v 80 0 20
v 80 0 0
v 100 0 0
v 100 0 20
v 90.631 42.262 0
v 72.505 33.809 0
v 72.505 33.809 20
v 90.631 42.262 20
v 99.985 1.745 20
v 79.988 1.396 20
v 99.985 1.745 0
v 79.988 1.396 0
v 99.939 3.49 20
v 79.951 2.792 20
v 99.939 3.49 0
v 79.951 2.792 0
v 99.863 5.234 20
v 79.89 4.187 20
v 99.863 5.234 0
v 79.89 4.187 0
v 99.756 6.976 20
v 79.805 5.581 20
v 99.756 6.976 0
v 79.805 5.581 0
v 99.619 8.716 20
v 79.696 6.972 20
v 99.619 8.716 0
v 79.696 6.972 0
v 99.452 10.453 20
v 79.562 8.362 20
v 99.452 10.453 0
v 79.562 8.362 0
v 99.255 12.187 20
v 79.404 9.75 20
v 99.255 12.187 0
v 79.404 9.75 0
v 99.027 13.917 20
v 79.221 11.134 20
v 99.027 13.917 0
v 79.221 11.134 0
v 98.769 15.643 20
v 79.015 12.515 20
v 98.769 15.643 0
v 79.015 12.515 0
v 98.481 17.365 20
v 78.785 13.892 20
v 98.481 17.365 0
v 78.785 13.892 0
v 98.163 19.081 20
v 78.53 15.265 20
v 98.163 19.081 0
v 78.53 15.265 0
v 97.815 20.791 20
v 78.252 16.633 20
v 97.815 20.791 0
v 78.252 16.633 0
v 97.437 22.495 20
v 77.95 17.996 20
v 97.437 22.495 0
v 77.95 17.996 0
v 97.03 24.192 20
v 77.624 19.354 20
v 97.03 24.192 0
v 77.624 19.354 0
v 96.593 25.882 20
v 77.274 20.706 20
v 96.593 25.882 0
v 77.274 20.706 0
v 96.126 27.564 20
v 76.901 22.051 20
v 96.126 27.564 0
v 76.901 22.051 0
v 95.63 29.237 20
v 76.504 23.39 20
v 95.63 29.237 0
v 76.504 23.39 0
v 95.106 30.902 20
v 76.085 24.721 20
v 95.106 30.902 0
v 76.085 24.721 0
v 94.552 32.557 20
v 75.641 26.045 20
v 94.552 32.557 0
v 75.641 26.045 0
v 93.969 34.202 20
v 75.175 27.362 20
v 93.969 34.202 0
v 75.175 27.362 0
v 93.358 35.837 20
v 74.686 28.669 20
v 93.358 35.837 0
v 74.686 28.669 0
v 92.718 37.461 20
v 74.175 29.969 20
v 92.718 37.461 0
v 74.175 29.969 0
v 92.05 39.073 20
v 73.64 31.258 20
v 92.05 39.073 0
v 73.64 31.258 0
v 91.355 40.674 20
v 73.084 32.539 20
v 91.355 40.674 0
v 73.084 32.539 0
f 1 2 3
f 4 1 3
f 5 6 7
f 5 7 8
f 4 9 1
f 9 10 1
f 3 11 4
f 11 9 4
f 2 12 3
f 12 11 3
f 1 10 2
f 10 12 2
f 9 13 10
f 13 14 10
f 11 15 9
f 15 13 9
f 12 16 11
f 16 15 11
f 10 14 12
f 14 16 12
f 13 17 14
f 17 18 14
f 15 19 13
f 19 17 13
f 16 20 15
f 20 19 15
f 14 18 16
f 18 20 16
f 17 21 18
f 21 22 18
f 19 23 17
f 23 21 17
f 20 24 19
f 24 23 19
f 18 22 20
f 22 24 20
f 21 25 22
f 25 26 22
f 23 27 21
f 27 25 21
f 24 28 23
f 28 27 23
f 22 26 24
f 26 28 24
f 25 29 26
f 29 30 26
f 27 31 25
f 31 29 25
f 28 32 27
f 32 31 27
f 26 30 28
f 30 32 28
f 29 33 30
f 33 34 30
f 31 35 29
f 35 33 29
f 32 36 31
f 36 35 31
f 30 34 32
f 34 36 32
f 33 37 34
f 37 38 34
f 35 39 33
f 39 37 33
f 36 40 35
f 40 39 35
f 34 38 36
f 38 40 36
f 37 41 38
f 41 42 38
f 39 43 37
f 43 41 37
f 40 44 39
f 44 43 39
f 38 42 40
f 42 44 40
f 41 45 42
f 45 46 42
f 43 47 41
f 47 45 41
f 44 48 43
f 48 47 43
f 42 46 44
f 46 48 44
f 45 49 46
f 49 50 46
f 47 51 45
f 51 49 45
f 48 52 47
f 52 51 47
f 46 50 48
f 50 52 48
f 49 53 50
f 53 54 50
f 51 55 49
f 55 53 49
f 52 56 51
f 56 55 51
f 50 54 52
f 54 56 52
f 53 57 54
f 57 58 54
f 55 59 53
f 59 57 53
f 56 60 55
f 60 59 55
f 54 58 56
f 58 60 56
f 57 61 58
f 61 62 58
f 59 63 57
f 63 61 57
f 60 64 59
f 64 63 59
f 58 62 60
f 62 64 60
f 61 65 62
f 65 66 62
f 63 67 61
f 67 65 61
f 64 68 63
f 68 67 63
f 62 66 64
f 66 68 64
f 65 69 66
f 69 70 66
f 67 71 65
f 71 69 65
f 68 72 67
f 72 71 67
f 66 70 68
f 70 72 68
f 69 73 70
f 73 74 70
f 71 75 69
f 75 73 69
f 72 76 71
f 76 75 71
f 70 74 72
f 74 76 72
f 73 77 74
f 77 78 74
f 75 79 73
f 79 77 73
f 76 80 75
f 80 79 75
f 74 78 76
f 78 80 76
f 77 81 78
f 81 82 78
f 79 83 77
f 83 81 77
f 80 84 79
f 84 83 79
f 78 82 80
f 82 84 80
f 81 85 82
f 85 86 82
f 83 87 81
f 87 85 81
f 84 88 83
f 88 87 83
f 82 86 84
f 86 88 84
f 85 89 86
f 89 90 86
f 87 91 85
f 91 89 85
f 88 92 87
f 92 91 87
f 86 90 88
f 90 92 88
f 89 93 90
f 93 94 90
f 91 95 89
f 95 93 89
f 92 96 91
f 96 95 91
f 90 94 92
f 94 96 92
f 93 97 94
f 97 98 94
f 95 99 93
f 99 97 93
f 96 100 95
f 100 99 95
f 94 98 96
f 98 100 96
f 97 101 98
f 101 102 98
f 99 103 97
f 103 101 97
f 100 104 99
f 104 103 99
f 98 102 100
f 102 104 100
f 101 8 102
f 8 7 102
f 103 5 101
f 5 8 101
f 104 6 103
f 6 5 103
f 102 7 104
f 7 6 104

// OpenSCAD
$fn=360;
n=5;
rotate_extrude(angle=25) translate([20*(n-1),0,0])square(20);
